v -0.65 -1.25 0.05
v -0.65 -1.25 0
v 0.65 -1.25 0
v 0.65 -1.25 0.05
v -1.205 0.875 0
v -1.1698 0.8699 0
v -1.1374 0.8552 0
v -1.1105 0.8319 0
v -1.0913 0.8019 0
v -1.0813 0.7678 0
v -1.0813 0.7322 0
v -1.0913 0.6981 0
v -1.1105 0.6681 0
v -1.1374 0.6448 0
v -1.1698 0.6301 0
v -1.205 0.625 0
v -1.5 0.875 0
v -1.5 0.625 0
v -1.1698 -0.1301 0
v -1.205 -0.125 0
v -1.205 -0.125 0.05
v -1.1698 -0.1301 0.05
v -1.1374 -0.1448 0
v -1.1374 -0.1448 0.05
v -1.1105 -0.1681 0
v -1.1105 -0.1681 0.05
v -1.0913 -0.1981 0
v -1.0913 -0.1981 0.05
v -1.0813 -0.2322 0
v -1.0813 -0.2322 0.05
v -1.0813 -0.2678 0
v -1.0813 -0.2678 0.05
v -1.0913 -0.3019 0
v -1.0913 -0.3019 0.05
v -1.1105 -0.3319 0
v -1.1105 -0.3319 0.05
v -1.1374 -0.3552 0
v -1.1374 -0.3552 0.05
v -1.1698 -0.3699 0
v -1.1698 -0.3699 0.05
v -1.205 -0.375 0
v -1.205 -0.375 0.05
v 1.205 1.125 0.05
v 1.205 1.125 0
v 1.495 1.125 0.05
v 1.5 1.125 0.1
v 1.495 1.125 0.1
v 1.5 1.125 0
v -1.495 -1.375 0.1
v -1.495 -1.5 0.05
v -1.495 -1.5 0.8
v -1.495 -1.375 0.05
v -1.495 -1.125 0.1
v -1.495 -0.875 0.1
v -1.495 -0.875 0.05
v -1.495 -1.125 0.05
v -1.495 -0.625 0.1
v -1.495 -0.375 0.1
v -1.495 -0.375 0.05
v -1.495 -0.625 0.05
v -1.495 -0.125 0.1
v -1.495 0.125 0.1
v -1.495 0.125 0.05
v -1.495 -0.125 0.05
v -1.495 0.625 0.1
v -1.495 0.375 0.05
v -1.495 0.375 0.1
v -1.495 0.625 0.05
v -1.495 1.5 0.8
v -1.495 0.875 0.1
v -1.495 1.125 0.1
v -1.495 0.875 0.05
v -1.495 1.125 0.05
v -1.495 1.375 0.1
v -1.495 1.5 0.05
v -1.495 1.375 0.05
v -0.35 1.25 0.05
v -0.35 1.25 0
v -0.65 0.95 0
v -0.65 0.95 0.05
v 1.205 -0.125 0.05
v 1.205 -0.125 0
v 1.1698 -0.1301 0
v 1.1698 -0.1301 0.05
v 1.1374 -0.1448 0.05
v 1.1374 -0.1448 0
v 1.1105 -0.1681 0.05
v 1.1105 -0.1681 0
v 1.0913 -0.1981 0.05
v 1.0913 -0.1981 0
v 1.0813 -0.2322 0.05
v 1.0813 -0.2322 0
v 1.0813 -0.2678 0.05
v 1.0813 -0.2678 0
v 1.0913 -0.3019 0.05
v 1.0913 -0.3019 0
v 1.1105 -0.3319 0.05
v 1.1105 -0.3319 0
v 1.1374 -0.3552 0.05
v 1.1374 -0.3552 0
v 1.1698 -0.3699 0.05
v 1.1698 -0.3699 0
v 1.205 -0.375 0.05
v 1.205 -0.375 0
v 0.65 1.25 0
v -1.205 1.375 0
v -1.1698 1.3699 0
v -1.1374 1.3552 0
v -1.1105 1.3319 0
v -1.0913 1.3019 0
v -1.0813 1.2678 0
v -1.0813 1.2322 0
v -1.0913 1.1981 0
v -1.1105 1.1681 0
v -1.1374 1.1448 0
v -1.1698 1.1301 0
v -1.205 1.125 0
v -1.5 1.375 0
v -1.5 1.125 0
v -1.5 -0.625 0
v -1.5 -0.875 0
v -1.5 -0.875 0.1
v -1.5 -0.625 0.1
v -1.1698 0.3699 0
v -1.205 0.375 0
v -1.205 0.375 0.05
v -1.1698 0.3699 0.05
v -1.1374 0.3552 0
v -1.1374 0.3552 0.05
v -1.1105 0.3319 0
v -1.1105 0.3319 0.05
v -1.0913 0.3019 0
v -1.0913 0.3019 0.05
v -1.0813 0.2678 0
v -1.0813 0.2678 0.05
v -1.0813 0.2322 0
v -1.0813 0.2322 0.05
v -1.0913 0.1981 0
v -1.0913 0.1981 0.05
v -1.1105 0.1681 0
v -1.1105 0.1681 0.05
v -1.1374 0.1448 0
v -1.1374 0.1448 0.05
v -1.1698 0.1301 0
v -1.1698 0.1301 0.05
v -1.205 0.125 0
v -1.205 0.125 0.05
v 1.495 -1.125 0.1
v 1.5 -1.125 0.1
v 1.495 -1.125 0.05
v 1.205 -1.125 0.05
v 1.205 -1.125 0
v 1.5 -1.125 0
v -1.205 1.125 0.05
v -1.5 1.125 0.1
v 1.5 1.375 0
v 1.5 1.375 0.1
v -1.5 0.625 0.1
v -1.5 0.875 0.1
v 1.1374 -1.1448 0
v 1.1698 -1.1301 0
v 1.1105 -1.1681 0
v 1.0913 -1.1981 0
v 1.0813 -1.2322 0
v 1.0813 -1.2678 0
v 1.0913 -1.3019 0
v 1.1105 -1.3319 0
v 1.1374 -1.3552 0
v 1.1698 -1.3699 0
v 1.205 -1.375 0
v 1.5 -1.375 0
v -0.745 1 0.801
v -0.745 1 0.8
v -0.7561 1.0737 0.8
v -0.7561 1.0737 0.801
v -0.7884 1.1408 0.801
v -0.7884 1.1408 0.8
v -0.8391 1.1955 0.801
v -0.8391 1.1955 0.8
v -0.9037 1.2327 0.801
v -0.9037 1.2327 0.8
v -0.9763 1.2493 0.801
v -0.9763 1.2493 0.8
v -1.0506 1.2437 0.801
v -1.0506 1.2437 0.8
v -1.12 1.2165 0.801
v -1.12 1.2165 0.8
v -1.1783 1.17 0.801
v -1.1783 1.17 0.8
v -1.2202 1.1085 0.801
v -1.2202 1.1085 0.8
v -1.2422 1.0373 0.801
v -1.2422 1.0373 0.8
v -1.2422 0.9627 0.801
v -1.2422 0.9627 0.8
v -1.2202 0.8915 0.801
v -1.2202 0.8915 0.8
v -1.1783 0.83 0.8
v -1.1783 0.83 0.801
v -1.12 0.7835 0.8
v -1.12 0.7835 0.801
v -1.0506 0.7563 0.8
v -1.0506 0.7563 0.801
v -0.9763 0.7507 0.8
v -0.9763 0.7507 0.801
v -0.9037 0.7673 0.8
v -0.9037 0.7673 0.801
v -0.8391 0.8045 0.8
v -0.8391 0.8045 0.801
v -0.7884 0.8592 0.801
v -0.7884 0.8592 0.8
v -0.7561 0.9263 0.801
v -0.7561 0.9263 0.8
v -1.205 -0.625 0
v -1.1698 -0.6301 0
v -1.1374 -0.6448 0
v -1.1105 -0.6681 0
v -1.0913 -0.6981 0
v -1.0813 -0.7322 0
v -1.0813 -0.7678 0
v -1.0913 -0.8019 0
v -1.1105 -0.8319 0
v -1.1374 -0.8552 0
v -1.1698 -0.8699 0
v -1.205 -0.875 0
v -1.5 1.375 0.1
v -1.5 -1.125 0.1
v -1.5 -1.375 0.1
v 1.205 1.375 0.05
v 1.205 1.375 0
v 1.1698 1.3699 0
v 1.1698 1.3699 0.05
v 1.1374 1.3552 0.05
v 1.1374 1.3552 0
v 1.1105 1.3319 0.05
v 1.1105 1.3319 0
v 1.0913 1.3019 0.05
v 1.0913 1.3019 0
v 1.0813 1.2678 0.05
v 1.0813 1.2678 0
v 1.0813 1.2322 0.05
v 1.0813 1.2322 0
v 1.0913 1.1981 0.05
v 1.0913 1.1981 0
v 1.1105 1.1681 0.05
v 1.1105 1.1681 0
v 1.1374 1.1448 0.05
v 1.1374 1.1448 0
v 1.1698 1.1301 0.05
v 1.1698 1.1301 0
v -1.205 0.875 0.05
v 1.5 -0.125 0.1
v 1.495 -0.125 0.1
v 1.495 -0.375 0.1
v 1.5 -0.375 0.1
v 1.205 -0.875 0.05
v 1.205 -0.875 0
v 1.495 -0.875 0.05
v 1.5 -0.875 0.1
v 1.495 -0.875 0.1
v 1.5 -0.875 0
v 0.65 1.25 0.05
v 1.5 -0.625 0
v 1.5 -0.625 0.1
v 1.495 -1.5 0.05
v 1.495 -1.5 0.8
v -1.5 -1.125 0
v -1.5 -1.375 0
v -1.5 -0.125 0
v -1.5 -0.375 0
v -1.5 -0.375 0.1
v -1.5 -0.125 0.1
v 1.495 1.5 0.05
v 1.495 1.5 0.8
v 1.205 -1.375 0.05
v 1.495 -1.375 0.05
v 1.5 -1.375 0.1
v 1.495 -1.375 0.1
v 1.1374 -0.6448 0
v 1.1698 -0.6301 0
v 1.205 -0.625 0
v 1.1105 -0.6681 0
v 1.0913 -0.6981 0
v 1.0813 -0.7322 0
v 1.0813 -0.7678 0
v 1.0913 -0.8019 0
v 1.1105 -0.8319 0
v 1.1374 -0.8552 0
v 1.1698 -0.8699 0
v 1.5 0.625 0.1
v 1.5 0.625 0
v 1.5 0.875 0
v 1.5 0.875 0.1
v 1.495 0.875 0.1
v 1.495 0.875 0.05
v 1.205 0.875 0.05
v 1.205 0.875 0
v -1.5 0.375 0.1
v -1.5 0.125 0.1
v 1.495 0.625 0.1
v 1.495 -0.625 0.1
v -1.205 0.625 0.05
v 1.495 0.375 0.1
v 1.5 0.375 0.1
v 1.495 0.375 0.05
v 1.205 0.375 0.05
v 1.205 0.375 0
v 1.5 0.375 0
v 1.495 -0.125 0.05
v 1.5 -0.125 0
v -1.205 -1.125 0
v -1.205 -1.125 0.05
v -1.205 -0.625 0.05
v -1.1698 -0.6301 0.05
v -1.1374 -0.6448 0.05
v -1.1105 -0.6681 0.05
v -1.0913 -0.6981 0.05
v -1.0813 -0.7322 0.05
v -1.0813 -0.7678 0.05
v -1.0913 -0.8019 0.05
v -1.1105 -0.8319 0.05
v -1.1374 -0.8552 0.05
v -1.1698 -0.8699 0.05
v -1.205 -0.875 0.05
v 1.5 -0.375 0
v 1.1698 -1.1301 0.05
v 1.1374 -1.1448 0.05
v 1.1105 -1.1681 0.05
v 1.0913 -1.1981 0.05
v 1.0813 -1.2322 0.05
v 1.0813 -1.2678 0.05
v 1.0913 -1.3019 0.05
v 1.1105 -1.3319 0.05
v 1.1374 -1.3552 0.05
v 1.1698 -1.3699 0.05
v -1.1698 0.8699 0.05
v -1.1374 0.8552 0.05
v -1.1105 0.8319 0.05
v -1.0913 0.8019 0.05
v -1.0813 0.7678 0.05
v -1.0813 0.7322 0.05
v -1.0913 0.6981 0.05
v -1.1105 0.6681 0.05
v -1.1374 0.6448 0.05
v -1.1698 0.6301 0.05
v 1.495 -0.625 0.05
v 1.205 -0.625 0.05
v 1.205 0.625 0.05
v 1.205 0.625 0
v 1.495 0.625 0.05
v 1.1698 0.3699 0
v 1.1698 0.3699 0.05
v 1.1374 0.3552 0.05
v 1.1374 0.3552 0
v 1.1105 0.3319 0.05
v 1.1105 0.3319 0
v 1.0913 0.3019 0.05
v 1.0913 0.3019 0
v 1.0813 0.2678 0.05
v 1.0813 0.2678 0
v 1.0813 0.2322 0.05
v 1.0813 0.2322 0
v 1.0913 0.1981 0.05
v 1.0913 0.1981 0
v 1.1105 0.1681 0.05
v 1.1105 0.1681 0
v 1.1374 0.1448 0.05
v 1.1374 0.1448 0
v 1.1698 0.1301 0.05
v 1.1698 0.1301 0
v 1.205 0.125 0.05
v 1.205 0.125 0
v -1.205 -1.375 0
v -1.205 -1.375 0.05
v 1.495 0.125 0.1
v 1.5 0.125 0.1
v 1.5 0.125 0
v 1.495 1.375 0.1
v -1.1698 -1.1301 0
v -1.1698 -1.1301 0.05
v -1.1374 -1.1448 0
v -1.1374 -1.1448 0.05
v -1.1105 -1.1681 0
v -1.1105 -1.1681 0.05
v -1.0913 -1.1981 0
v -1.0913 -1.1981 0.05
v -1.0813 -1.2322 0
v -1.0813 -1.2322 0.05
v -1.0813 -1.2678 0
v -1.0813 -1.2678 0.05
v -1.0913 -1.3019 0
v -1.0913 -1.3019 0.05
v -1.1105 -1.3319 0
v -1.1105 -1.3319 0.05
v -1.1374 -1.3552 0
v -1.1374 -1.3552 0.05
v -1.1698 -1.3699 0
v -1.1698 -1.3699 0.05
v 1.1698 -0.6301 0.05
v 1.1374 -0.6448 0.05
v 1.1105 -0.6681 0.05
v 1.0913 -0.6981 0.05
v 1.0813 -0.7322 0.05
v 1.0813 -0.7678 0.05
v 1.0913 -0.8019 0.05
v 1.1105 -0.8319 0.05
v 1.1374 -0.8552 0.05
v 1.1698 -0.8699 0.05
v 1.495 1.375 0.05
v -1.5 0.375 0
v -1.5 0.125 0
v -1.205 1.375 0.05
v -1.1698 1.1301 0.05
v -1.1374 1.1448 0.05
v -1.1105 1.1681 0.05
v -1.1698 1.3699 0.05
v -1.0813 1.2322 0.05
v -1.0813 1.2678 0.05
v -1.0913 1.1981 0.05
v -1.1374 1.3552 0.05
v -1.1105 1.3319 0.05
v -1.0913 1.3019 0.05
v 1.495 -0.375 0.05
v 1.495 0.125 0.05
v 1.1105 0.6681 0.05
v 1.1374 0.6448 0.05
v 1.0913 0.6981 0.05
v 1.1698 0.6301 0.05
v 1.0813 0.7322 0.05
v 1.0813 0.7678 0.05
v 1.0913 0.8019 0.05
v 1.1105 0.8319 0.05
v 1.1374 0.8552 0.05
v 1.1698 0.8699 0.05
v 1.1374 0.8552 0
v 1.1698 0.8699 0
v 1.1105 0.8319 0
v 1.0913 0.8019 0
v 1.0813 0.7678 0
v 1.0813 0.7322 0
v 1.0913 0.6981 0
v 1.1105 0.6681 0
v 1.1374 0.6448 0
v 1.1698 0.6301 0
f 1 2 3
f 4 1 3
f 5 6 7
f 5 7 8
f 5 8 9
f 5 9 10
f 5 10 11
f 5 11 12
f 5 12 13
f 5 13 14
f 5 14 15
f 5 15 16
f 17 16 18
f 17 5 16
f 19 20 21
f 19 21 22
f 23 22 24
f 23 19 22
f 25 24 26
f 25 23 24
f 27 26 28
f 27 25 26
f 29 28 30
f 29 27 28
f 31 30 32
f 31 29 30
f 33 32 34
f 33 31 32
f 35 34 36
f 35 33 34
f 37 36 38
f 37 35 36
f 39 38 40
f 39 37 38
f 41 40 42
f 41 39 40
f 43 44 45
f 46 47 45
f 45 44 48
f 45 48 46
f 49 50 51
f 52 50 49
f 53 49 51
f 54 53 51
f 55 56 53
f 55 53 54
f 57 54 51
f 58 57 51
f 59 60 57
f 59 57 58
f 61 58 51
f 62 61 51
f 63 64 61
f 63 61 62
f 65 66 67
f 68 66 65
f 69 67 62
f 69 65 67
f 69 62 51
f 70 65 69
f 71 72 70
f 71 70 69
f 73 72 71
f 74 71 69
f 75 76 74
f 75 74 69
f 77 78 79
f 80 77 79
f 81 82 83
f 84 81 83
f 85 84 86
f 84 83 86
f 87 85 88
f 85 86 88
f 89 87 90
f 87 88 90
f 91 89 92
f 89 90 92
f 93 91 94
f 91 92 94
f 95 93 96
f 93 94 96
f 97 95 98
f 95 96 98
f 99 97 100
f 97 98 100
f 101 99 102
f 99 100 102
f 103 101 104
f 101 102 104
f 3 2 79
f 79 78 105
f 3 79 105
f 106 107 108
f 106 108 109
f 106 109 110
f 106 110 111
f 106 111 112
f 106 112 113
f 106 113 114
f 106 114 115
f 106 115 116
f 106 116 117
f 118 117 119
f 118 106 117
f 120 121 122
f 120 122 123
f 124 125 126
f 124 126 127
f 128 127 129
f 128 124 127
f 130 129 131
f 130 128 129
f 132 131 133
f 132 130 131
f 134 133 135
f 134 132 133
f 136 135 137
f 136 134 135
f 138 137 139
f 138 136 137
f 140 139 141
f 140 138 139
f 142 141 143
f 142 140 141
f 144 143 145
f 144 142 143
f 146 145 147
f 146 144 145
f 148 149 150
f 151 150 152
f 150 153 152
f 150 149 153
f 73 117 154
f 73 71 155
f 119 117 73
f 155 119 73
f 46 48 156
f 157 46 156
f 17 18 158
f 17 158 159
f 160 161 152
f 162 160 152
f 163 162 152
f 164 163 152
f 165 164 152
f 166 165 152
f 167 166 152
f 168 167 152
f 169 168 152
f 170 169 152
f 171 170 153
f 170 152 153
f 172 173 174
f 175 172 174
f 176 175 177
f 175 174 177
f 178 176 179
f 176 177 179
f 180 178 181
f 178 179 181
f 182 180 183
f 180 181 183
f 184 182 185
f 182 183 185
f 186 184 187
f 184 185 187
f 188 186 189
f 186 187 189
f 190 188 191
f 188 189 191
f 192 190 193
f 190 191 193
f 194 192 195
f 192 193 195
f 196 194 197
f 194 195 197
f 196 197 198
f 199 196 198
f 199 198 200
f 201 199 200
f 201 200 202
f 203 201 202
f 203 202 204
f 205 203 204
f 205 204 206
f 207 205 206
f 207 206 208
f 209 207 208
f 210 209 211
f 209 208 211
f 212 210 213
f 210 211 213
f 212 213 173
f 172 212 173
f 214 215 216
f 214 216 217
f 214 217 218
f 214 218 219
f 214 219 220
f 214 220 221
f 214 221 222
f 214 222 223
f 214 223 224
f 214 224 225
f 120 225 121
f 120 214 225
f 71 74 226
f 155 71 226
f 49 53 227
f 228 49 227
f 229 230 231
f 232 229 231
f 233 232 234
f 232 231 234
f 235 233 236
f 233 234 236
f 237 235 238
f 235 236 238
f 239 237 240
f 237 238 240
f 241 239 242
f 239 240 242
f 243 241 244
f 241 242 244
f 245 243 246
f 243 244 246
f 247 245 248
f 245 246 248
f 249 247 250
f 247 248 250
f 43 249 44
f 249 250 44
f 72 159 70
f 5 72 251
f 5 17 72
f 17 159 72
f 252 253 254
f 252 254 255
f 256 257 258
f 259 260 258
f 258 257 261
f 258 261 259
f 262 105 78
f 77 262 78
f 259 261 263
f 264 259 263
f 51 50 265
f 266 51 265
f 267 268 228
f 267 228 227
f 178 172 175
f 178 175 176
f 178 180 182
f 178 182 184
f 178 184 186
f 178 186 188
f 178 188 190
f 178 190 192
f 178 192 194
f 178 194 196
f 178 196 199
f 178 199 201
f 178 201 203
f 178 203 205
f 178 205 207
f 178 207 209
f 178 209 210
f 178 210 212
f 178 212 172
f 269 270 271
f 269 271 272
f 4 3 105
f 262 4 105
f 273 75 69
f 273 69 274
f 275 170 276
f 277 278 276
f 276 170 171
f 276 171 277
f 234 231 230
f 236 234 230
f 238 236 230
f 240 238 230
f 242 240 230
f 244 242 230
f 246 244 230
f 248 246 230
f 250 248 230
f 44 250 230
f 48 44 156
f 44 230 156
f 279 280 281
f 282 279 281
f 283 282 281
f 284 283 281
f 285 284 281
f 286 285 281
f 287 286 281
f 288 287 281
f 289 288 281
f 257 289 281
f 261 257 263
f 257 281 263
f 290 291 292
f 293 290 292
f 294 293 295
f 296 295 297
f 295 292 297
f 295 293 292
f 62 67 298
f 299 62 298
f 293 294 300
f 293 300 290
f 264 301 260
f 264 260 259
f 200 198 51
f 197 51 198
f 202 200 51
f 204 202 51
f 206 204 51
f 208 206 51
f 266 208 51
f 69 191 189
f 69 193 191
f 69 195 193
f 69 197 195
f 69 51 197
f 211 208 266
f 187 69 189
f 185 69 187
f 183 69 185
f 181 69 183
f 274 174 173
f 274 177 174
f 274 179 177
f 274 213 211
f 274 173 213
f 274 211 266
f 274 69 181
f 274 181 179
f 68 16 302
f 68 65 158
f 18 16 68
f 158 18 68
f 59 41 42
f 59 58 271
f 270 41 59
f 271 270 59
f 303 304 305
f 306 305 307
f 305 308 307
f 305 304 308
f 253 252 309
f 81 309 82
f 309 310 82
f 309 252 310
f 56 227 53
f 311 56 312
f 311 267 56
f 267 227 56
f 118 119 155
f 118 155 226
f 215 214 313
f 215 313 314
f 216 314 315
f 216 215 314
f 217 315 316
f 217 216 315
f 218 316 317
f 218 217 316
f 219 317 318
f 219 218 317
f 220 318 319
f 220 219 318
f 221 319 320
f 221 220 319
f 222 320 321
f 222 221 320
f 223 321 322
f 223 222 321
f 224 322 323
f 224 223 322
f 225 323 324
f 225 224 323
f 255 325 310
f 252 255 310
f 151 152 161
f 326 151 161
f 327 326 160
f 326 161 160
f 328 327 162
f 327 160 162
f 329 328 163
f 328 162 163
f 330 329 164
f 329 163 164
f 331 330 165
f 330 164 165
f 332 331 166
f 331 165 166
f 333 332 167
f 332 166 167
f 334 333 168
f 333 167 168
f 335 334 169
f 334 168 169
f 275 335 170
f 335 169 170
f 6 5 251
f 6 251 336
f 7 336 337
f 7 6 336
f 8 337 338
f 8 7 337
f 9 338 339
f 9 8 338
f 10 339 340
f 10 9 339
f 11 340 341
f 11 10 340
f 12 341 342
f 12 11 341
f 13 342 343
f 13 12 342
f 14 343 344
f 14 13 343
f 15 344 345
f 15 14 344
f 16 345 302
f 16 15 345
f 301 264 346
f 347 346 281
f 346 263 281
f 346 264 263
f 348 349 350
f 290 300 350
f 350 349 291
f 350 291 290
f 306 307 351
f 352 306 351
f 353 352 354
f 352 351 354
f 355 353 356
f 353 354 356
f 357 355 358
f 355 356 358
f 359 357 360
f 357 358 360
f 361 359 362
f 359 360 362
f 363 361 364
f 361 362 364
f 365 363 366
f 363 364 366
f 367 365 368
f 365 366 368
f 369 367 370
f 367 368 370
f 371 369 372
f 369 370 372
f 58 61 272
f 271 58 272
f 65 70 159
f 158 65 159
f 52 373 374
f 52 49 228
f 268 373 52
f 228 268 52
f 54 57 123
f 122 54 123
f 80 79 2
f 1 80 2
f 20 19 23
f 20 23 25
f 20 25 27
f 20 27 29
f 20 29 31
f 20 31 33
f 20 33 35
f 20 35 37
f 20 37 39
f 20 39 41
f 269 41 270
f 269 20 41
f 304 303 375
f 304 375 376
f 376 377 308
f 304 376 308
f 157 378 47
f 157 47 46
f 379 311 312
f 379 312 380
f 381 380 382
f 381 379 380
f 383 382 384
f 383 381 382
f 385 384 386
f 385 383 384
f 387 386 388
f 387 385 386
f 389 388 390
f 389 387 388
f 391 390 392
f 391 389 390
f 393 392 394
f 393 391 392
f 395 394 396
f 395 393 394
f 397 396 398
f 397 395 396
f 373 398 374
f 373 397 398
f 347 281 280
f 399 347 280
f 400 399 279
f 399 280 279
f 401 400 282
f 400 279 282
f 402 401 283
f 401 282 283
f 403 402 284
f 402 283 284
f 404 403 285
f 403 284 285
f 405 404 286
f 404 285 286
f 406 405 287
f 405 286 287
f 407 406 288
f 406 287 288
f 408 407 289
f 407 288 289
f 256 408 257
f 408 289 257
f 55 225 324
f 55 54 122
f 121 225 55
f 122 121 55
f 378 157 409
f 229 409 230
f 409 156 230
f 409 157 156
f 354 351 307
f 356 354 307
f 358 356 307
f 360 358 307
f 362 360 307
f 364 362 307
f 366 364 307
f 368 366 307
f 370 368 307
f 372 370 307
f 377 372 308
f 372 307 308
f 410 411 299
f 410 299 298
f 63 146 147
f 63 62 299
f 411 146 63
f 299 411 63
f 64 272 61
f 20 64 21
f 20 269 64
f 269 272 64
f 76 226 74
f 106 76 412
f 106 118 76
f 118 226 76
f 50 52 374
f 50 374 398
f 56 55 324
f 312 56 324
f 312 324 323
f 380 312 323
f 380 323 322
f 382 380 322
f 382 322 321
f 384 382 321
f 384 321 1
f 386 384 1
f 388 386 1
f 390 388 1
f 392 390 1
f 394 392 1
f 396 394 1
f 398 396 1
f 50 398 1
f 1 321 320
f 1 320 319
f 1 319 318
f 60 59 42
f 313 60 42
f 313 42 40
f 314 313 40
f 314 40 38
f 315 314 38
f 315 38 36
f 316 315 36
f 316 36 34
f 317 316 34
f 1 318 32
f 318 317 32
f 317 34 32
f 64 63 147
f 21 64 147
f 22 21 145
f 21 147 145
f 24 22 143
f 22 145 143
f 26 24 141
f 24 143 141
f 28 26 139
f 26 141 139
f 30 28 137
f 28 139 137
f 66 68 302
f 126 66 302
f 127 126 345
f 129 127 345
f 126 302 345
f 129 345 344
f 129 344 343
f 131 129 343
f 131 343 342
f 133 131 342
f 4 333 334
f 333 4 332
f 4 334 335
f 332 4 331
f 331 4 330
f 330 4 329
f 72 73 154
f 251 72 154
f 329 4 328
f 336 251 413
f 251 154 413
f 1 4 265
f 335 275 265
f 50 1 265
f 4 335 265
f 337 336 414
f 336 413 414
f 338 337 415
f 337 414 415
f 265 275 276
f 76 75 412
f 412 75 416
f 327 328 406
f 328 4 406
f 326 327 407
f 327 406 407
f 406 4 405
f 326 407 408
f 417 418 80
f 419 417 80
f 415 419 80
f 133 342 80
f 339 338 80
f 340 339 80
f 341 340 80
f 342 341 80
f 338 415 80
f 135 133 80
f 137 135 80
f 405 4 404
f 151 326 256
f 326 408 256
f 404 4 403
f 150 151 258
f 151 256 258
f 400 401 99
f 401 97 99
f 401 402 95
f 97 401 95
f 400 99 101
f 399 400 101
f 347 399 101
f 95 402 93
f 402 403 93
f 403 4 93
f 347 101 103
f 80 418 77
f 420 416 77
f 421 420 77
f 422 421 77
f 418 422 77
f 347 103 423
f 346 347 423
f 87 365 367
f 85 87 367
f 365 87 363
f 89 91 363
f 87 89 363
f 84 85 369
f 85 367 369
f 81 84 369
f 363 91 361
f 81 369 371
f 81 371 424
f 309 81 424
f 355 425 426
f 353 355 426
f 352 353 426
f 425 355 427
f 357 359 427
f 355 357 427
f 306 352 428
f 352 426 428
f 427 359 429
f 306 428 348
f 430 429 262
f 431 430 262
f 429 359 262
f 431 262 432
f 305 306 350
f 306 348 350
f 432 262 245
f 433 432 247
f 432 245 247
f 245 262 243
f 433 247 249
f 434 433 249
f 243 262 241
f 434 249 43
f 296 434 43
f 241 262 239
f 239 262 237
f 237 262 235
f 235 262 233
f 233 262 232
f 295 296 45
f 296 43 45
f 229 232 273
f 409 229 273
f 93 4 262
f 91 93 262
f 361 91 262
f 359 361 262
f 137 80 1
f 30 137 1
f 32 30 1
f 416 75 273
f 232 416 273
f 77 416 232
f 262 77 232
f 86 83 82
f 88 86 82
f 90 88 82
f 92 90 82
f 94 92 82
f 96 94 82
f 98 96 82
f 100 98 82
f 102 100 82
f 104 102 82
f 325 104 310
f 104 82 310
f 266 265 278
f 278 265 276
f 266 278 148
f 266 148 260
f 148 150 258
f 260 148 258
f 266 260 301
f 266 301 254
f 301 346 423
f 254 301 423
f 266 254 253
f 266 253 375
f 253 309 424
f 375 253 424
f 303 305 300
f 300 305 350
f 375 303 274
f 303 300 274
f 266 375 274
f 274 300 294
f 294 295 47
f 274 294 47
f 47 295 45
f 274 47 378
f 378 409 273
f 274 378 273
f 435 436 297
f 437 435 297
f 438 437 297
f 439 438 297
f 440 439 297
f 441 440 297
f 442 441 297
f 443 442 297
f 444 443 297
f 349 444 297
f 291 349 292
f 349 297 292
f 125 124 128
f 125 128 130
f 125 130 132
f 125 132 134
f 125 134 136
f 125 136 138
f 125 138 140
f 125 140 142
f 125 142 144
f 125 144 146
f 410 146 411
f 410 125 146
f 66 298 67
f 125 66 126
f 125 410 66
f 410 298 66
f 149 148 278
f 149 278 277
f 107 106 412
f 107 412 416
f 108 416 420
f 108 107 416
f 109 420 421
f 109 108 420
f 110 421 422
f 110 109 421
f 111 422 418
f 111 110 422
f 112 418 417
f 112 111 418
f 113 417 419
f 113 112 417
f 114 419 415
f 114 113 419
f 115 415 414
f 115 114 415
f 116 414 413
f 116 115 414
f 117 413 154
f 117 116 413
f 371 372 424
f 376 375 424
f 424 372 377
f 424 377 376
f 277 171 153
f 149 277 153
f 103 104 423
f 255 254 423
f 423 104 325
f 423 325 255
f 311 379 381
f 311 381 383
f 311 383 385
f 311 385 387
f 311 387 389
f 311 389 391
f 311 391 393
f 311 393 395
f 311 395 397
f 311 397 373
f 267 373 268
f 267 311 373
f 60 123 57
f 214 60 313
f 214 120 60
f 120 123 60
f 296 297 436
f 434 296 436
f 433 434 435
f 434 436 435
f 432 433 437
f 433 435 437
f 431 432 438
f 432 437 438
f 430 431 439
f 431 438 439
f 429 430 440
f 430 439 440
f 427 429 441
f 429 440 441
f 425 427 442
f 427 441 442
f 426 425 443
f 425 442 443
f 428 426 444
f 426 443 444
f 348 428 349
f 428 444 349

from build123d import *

# Parameters (mm, degrees)
BASE_START  = 0.05
ESQUISSE1_W = 2.99
ESQUISSE1_H = 3
BASE_DEPTH  = 0.75
PADS_DEPTH  = 0.1
ESQUISSE4_R = 0.25
MARK_DEPTH  = 0.001


with BuildPart() as part:
    # Esquisse1 → base (new body)
    with BuildSketch(Plane.XY.offset(BASE_START)):
        Rectangle(ESQUISSE1_W, ESQUISSE1_H)
    extrude(amount=BASE_DEPTH)

    # Esquisse3 → pads (add)
    with BuildSketch(Plane.XY):
        with BuildLine():
            Line((-1.5, 1.375), (-1.205, 1.375))
            ThreePointArc((-1.205, 1.375), (-1.08, 1.25), (-1.205, 1.125))
            Line((-1.205, 1.125), (-1.5, 1.125))
            Line((-1.5, 1.125), (-1.5, 1.375))
        make_face()
        with BuildLine():
            Line((-1.205, 0.625), (-1.5, 0.625))
            Line((-1.5, 0.625), (-1.5, 0.875))
            Line((-1.5, 0.875), (-1.205, 0.875))
            ThreePointArc((-1.205, 0.875), (-1.08, 0.75), (-1.205, 0.625))
        make_face()
        with BuildLine():
            Line((-1.205, 0.125), (-1.5, 0.125))
            Line((-1.5, 0.125), (-1.5, 0.375))
            Line((-1.5, 0.375), (-1.205, 0.375))
            ThreePointArc((-1.205, 0.375), (-1.08, 0.25), (-1.205, 0.125))
        make_face()
        with BuildLine():
            Line((-1.205, -0.375), (-1.5, -0.375))
            Line((-1.5, -0.375), (-1.5, -0.125))
            Line((-1.5, -0.125), (-1.205, -0.125))
            ThreePointArc((-1.205, -0.125), (-1.08, -0.25), (-1.205, -0.375))
        make_face()
        with BuildLine():
            Line((-1.205, -0.875), (-1.5, -0.875))
            Line((-1.5, -0.875), (-1.5, -0.625))
            Line((-1.5, -0.625), (-1.205, -0.625))
            ThreePointArc((-1.205, -0.625), (-1.08, -0.75), (-1.205, -0.875))
        make_face()
        with BuildLine():
            Line((-1.205, -1.375), (-1.5, -1.375))
            Line((-1.5, -1.375), (-1.5, -1.125))
            Line((-1.5, -1.125), (-1.205, -1.125))
            ThreePointArc((-1.205, -1.125), (-1.08, -1.25), (-1.205, -1.375))
        make_face()
        with BuildLine():
            Line((1.5, 1.375), (1.205, 1.375))
            ThreePointArc((1.205, 1.375), (1.08, 1.25), (1.205, 1.125))
            Line((1.205, 1.125), (1.5, 1.125))
            Line((1.5, 1.125), (1.5, 1.375))
        make_face()
        with BuildLine():
            Line((1.5, -1.125), (1.205, -1.125))
            ThreePointArc((1.205, -1.125), (1.08, -1.25), (1.205, -1.375))
            Line((1.205, -1.375), (1.5, -1.375))
            Line((1.5, -1.375), (1.5, -1.125))
        make_face()
        with BuildLine():
            Line((1.5, -0.625), (1.205, -0.625))
            ThreePointArc((1.205, -0.625), (1.08, -0.75), (1.205, -0.875))
            Line((1.205, -0.875), (1.5, -0.875))
            Line((1.5, -0.875), (1.5, -0.625))
        make_face()
        with BuildLine():
            Line((1.5, -0.125), (1.205, -0.125))
            ThreePointArc((1.205, -0.125), (1.08, -0.25), (1.205, -0.375))
            Line((1.205, -0.375), (1.5, -0.375))
            Line((1.5, -0.375), (1.5, -0.125))
        make_face()
        with BuildLine():
            Line((1.5, 0.375), (1.205, 0.375))
            ThreePointArc((1.205, 0.375), (1.08, 0.25), (1.205, 0.125))
            Line((1.205, 0.125), (1.5, 0.125))
            Line((1.5, 0.125), (1.5, 0.375))
        make_face()
        with BuildLine():
            Line((1.5, 0.875), (1.205, 0.875))
            ThreePointArc((1.205, 0.875), (1.08, 0.75), (1.205, 0.625))
            Line((1.205, 0.625), (1.5, 0.625))
            Line((1.5, 0.625), (1.5, 0.875))
        make_face()
        Polygon((-0.65, -1.25), (0.65, -1.25), (0.65, 1.25), (-0.35, 1.25), (-0.65, 0.95), align=None)
    extrude(amount=PADS_DEPTH)

    # Esquisse4 → mark (add)
    with BuildSketch(Plane.XY.offset(0.8)):
        with Locations((-0.995, 1)):
            Circle(ESQUISSE4_R)
    extrude(amount=MARK_DEPTH)


solid = part.part
